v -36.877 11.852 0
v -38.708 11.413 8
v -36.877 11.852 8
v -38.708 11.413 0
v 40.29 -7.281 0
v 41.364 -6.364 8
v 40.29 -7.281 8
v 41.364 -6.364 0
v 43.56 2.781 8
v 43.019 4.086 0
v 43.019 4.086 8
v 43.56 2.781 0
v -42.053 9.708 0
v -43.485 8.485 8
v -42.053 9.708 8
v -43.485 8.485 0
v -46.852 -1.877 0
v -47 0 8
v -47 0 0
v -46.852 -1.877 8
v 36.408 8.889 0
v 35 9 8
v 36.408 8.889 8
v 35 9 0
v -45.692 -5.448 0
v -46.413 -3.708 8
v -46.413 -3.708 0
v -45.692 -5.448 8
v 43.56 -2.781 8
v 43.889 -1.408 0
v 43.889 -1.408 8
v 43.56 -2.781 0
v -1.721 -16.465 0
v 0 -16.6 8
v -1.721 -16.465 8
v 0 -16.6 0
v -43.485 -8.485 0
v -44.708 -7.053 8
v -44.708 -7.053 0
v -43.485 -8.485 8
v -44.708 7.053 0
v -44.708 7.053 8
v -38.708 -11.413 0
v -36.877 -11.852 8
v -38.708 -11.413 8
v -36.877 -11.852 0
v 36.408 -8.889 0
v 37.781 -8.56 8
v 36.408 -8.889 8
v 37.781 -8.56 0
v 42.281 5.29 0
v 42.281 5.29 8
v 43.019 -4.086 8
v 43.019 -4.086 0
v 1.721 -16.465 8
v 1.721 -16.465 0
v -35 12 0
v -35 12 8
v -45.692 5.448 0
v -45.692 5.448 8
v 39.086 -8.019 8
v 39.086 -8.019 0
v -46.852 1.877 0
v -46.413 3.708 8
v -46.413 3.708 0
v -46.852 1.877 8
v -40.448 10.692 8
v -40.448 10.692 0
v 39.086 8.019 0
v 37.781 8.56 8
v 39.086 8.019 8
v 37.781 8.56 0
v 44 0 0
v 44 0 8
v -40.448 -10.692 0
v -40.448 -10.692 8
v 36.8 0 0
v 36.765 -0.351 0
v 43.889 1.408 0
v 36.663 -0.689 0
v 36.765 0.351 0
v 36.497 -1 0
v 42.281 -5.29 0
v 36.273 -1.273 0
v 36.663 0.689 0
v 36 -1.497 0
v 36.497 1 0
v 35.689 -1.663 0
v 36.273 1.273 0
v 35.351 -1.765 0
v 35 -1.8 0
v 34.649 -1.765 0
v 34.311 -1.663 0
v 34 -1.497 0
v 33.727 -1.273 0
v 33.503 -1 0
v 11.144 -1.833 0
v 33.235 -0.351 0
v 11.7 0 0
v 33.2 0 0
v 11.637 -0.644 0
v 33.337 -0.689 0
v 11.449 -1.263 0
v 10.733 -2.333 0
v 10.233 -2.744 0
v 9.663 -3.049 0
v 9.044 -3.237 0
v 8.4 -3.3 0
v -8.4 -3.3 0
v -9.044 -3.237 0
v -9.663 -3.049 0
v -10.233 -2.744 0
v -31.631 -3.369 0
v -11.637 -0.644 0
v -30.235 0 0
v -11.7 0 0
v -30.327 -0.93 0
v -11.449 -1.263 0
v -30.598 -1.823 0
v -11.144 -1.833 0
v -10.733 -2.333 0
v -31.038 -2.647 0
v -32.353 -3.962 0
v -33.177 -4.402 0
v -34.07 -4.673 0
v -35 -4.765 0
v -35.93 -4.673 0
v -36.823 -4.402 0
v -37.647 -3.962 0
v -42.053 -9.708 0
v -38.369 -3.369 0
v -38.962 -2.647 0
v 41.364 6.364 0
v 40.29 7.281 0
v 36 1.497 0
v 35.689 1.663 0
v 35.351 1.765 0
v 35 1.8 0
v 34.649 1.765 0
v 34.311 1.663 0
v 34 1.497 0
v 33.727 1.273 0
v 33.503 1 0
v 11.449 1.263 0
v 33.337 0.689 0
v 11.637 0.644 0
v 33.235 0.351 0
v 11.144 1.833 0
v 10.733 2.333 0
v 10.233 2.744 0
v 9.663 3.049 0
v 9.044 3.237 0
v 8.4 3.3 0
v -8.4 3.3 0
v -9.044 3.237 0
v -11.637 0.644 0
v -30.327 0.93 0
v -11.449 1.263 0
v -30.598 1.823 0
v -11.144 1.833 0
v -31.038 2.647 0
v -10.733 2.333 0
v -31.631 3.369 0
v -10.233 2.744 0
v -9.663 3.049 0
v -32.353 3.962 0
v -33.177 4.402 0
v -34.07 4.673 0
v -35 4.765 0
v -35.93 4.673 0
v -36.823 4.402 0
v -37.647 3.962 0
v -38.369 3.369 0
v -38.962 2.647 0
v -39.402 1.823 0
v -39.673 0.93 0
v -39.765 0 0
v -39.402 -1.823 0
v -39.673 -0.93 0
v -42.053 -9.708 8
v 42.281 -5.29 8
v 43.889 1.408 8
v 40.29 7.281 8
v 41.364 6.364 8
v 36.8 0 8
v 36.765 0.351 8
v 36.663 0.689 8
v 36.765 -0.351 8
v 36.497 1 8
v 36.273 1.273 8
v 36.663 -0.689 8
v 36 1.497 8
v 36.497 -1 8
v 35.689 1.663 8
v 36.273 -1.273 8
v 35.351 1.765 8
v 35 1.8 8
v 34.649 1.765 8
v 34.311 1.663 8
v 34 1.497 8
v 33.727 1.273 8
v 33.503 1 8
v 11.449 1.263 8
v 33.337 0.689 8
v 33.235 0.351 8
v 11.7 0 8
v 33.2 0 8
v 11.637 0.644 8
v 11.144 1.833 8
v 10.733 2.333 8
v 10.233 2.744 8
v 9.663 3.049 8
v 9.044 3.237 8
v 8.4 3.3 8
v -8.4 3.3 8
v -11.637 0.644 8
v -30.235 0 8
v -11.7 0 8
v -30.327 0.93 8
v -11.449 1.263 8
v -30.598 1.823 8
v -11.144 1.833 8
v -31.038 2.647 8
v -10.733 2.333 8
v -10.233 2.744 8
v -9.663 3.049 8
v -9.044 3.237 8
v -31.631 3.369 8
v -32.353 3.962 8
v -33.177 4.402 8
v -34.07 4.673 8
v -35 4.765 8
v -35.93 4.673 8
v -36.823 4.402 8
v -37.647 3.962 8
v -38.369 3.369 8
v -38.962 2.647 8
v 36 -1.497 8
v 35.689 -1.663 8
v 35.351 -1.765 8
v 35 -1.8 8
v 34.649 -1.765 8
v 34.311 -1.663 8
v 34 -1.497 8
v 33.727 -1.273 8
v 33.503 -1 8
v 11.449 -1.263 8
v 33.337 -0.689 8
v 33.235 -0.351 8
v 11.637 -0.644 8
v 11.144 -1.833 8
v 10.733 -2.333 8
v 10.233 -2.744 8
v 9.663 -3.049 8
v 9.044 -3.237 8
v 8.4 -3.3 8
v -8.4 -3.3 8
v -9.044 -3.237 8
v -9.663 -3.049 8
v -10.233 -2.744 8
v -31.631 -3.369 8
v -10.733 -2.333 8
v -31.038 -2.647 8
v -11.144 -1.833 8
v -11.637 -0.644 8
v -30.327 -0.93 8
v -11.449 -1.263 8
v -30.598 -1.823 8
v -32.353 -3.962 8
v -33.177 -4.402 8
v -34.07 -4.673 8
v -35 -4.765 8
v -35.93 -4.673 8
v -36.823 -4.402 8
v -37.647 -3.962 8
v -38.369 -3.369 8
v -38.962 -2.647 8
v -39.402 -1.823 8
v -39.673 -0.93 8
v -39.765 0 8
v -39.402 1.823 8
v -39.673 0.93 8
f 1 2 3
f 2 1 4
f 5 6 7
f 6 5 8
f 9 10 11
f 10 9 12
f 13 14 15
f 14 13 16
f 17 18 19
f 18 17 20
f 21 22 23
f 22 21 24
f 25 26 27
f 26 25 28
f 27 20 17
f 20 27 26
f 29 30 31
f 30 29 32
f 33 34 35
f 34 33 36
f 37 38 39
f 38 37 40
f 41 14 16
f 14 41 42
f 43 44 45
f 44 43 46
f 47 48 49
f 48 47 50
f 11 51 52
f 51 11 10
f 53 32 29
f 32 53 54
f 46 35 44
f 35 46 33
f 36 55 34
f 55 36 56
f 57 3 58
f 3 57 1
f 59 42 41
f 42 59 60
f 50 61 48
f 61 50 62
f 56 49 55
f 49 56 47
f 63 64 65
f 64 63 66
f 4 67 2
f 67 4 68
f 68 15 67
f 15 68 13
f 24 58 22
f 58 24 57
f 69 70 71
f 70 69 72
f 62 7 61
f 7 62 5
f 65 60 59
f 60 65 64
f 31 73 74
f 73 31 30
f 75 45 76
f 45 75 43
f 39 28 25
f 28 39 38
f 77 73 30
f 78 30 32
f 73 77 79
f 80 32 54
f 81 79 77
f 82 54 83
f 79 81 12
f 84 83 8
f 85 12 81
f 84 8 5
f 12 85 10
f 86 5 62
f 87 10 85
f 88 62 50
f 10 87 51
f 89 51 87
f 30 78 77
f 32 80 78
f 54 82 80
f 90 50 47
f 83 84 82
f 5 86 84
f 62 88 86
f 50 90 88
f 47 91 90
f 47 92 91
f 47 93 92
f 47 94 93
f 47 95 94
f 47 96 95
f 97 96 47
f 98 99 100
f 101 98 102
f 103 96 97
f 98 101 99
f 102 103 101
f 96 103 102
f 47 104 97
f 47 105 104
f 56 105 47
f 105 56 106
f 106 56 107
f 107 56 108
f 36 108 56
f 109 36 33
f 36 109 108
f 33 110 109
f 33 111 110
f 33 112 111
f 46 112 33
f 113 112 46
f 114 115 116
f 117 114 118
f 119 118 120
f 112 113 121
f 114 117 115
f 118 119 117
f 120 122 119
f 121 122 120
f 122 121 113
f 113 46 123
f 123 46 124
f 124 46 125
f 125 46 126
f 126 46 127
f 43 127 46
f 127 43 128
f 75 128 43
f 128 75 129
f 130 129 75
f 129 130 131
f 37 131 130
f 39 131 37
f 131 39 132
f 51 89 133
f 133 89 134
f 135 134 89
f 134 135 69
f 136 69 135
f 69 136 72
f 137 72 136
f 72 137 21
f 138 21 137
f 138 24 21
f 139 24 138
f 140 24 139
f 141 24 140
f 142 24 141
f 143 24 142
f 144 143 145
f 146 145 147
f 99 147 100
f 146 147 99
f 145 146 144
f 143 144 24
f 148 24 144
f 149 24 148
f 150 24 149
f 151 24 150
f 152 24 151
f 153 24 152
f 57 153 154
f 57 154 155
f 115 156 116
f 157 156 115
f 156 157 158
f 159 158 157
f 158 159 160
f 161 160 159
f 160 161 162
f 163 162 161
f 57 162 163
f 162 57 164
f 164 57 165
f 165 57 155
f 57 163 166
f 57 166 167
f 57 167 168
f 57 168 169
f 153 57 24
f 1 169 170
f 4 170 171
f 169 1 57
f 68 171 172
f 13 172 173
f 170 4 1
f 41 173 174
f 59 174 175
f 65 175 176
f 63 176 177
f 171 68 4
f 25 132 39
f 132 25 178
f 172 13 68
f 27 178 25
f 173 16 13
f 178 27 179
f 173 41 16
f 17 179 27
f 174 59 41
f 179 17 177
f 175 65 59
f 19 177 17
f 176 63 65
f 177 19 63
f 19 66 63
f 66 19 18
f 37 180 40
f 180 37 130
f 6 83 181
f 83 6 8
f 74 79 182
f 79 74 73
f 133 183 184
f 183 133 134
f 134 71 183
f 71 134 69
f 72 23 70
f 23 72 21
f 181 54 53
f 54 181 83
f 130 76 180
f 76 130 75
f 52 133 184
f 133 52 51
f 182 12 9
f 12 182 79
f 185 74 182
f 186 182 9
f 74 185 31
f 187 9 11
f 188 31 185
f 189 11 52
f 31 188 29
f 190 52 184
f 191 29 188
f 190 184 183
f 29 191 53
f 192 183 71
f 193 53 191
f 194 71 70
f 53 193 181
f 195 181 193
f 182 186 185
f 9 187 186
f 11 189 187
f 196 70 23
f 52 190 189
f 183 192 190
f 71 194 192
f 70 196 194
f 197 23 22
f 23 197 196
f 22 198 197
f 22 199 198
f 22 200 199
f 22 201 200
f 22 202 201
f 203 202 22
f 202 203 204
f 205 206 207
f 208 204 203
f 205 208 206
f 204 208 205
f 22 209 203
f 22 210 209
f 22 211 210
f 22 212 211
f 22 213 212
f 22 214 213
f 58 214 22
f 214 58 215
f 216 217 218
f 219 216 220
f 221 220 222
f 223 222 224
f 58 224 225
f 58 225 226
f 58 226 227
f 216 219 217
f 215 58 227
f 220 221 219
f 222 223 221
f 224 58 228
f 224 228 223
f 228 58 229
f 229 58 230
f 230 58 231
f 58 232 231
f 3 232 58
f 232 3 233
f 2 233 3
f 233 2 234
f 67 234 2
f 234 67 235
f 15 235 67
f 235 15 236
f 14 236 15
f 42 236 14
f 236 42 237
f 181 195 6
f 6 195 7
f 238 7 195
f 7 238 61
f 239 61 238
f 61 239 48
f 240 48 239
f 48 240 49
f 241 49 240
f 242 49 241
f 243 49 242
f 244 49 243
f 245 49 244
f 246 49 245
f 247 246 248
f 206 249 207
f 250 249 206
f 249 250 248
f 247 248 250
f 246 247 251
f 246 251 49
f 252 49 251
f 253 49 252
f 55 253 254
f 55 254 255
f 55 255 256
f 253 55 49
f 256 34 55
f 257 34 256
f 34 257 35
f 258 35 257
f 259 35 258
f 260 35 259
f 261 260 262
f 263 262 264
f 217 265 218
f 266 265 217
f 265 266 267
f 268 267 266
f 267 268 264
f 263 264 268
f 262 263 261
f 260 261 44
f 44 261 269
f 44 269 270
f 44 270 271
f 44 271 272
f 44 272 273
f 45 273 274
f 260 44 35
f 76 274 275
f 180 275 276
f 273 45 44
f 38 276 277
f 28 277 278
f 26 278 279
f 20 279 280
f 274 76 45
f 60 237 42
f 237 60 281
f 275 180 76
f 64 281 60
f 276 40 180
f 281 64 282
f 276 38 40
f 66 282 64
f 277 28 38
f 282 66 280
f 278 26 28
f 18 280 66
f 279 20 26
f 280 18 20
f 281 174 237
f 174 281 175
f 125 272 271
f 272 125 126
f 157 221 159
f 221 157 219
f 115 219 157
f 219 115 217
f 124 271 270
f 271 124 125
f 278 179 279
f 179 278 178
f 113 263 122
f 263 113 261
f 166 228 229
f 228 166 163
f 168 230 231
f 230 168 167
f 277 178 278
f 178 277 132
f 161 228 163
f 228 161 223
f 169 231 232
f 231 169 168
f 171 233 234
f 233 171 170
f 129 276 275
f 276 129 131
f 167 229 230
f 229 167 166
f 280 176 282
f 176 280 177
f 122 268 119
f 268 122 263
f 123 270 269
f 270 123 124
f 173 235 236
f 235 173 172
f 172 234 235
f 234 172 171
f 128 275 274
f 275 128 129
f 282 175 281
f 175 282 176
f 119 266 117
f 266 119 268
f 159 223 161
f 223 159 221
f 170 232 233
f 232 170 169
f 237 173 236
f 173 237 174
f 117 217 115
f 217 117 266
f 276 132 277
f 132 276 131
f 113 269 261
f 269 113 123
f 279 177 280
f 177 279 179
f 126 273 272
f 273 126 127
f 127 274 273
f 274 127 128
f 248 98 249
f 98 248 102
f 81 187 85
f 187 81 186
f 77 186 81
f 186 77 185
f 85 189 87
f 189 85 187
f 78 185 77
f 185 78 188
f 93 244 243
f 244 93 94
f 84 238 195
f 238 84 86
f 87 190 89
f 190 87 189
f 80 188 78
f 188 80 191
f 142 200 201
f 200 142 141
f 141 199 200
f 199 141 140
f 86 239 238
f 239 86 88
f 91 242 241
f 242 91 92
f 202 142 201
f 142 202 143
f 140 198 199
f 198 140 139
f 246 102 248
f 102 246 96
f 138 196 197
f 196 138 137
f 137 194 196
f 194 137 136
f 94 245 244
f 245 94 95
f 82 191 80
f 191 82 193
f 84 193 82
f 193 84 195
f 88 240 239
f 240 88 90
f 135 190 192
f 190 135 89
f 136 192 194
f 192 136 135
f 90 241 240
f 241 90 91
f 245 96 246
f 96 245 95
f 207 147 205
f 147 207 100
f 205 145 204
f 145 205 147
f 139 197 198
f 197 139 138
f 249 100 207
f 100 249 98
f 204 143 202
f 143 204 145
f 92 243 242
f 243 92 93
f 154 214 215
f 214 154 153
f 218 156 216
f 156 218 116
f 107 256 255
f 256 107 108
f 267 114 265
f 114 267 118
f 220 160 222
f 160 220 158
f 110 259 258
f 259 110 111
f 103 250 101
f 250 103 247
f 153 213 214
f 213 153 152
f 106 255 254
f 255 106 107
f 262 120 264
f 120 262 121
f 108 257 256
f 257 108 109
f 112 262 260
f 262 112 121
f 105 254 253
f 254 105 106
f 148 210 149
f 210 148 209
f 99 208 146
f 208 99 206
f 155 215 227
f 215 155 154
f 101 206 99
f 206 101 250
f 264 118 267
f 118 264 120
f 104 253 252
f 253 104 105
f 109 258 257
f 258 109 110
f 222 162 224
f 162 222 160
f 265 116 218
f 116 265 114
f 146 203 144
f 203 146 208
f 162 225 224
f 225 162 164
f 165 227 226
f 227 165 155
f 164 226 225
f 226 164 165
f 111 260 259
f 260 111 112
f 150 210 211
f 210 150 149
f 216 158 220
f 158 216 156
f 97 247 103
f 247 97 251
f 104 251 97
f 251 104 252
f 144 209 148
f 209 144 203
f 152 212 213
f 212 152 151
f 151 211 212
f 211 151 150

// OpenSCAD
$fn = 32;

// ----------------------------------------------------------------------
// Lever: 70 mm between the bosses, 8 mm thick, smooth outline
// ----------------------------------------------------------------------

// --- parameters (mm) ---
lever_l = 70;             // distance between the boss centres
boss_a = 24;              // first boss diameter
boss_b = 18;              // second boss diameter
bore_a = 9.53;            // first bore
bore_b = 3.6;             // second bore
lever_t = 8;              // lever thickness
boss_c = 22;              // middle boss diameter
bend = 5.6;               // how far the middle boss drops
slot_w = 6.6;             // adjustment slot width

lever_profile = [[-47, 0], [-46.852, -1.877], [-46.413, -3.708], [-45.692, -5.448], [-44.708, -7.053], [-43.485, -8.485], [-42.053, -9.708], [-40.448, -10.692], [-38.708, -11.413], [-36.877, -11.852], [-1.721, -16.465], [0, -16.6], [1.721, -16.465], [36.408, -8.889], [37.781, -8.56], [39.086, -8.019], [40.29, -7.281], [41.364, -6.364], [42.281, -5.29], [43.019, -4.086], [43.56, -2.781], [43.889, -1.408], [44, 0], [43.889, 1.408], [43.56, 2.781], [43.019, 4.086], [42.281, 5.29], [41.364, 6.364], [40.29, 7.281], [39.086, 8.019], [37.781, 8.56], [36.408, 8.889], [35, 9], [-35, 12], [-36.877, 11.852], [-38.708, 11.413], [-40.448, 10.692], [-42.053, 9.708], [-43.485, 8.485], [-44.708, 7.053], [-45.692, 5.448], [-46.413, 3.708], [-46.852, 1.877]];

difference() {
  linear_extrude(height = lever_t) polygon(lever_profile);
  translate([-35, 0, -2.5]) cylinder(h = lever_t + 5, d = bore_a);
  translate([35, 0, -2.5]) cylinder(h = lever_t + 5, d = bore_b);
  /* slotted adjustment, stadium shaped */
  hull() {
    translate([-8.4, 0, -2.5]) cylinder(h = lever_t + 5, d = slot_w);
    translate([8.4, 0, -2.5]) cylinder(h = lever_t + 5, d = slot_w);
  }
}
